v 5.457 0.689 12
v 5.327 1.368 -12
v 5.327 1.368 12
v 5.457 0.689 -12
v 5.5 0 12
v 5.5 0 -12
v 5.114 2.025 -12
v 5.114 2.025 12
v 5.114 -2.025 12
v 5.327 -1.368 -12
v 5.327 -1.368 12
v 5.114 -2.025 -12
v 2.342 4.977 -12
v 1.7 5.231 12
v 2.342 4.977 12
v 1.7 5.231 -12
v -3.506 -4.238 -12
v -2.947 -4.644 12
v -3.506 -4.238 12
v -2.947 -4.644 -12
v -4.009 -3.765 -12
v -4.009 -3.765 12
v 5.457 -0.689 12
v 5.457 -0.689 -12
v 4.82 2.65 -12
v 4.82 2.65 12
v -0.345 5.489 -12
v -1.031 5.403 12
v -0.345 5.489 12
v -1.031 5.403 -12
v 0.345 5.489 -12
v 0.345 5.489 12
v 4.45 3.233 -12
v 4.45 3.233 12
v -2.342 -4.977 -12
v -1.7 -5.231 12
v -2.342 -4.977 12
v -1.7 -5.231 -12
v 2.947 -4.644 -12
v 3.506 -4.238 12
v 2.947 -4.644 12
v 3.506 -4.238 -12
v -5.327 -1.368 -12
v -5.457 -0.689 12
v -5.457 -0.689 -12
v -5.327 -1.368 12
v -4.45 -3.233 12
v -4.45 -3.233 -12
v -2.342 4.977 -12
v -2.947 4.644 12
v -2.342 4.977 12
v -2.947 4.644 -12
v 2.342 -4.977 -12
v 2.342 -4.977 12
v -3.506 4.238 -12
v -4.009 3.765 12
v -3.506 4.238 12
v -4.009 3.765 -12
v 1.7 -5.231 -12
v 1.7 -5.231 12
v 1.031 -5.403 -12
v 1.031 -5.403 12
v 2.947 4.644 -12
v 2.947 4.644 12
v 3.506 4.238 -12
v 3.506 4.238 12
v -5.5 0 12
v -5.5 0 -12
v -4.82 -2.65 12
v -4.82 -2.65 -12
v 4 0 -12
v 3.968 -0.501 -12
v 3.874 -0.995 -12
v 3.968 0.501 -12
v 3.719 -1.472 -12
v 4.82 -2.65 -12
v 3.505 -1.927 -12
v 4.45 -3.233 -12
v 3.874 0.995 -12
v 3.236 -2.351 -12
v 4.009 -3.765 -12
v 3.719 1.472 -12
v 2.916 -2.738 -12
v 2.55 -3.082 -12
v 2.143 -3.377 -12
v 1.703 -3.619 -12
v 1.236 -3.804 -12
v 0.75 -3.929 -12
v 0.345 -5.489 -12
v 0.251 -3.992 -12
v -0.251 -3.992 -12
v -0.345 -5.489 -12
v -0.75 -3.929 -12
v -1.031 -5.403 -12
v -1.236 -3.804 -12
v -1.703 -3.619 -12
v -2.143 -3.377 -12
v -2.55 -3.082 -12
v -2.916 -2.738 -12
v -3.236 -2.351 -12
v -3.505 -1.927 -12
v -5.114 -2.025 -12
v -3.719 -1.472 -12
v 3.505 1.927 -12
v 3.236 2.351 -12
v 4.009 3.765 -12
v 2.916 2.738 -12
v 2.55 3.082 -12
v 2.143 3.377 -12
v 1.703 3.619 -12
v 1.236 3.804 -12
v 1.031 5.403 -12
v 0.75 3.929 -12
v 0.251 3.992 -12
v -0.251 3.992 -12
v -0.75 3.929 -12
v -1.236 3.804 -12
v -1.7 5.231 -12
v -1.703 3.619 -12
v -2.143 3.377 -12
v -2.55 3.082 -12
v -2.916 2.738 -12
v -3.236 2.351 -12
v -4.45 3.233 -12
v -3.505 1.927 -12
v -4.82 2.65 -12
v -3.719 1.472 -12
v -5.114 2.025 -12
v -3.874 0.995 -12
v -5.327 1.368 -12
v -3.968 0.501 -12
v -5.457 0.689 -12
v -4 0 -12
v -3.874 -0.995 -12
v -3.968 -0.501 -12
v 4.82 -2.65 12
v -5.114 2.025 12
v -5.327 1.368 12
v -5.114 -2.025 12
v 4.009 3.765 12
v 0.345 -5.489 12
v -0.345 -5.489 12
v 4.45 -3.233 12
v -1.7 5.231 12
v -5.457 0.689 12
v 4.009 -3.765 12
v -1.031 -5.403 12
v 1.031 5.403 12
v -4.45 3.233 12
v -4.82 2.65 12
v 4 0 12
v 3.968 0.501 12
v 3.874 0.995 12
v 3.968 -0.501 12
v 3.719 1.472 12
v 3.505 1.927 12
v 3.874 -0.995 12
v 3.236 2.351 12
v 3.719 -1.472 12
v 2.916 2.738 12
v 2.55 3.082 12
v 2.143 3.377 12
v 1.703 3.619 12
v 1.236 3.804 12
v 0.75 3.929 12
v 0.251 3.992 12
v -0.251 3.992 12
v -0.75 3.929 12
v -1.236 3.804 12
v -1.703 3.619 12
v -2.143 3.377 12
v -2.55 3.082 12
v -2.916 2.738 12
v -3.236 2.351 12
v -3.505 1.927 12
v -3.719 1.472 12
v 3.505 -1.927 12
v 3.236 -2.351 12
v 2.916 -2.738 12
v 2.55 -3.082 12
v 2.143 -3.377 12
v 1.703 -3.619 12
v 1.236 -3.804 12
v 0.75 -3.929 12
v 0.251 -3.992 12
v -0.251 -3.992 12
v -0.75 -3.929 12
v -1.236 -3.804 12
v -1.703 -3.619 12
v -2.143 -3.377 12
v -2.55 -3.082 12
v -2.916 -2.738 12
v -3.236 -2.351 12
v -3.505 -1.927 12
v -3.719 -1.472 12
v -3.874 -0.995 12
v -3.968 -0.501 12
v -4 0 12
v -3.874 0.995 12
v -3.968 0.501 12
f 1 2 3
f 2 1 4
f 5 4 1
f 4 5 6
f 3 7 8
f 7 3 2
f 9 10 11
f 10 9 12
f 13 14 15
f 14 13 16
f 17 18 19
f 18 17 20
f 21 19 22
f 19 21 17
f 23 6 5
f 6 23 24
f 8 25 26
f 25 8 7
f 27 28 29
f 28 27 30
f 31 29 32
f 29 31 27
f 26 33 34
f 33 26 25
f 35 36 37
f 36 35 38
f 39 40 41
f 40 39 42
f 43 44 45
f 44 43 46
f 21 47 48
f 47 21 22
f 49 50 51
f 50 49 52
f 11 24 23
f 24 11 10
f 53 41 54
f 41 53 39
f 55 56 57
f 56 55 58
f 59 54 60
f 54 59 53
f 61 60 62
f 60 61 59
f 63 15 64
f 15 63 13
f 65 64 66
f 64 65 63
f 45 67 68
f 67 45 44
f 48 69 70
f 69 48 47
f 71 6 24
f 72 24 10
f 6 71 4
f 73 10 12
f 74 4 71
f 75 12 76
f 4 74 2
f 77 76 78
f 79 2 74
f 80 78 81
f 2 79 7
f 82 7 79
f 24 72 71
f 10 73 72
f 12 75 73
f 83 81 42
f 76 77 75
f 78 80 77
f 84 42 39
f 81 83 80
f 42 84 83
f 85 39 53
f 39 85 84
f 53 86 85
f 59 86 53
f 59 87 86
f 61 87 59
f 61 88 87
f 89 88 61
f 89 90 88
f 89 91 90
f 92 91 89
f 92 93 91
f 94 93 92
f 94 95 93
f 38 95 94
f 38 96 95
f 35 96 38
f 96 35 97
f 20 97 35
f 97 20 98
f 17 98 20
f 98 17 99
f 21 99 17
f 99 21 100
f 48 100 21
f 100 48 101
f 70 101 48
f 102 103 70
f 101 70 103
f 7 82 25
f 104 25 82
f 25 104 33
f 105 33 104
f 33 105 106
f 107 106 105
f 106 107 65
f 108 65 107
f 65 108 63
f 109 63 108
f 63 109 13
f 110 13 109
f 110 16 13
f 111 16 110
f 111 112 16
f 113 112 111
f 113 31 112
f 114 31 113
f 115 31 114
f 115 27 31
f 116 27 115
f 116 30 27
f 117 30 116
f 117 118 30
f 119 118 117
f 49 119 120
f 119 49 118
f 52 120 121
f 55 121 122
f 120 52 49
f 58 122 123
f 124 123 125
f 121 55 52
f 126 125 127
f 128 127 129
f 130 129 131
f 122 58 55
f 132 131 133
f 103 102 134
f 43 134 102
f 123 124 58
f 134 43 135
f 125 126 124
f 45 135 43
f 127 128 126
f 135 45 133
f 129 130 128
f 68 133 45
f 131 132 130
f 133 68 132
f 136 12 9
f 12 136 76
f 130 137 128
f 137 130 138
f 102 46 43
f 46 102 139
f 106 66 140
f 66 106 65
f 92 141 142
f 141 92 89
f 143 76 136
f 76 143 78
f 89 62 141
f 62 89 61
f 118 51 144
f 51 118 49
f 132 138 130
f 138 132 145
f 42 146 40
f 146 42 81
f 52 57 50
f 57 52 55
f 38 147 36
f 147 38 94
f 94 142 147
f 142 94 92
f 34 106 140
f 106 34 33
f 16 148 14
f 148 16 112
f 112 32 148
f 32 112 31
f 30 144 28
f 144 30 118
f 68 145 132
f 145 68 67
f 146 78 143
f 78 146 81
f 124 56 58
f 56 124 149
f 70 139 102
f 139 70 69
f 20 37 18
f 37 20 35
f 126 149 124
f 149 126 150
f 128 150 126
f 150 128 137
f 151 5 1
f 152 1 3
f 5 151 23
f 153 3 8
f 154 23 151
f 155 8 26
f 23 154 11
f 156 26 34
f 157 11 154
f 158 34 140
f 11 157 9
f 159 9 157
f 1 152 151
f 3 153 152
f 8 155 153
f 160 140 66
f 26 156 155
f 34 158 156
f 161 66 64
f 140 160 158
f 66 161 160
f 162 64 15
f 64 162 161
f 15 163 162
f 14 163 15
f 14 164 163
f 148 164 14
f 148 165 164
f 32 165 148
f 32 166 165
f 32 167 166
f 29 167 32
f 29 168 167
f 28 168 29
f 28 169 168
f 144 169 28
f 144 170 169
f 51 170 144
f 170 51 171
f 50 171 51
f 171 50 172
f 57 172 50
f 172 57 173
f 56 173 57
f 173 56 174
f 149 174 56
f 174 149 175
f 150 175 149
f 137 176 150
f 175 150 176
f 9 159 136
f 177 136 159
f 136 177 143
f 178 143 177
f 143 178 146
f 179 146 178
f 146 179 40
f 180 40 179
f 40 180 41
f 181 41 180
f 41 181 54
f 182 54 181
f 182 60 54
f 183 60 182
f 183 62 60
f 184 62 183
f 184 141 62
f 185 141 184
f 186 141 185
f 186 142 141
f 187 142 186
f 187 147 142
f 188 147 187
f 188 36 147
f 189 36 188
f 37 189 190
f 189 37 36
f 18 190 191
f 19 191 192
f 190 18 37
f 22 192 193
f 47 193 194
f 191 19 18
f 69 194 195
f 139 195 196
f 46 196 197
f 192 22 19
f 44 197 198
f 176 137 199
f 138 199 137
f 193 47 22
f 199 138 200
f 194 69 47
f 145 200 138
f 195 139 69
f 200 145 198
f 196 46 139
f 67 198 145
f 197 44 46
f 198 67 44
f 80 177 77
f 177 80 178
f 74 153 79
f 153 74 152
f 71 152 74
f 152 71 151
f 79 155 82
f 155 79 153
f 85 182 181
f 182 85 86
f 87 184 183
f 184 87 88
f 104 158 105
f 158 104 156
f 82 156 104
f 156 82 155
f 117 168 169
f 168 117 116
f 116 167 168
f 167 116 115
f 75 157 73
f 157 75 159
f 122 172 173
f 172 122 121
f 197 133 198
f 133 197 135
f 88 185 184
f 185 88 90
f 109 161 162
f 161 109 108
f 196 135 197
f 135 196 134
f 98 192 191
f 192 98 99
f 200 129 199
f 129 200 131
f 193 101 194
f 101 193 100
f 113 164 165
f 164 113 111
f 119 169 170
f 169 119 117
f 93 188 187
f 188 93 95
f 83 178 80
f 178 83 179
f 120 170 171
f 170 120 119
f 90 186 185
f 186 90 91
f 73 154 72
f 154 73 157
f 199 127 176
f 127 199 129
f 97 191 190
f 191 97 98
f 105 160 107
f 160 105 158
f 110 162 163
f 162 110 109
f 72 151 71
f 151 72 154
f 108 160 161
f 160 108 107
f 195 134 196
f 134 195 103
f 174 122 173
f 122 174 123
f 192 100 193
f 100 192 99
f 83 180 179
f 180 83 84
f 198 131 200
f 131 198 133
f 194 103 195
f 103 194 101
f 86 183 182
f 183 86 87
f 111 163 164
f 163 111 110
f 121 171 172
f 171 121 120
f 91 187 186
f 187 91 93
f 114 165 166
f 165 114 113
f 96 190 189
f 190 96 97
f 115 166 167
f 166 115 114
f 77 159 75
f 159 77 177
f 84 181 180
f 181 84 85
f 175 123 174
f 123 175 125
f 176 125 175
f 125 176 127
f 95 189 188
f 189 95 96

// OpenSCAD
$fn = 50;


difference() {
	union() {
		translate(v = [0, 0, -12.0000000000]) {
			cylinder(h = 24, r = 5.5000000000);
		}
	}
	union() {
		translate(v = [0, 0, -100.0000000000]) {
			cylinder(h = 200, r = 4.0000000000);
		}
	}
}
